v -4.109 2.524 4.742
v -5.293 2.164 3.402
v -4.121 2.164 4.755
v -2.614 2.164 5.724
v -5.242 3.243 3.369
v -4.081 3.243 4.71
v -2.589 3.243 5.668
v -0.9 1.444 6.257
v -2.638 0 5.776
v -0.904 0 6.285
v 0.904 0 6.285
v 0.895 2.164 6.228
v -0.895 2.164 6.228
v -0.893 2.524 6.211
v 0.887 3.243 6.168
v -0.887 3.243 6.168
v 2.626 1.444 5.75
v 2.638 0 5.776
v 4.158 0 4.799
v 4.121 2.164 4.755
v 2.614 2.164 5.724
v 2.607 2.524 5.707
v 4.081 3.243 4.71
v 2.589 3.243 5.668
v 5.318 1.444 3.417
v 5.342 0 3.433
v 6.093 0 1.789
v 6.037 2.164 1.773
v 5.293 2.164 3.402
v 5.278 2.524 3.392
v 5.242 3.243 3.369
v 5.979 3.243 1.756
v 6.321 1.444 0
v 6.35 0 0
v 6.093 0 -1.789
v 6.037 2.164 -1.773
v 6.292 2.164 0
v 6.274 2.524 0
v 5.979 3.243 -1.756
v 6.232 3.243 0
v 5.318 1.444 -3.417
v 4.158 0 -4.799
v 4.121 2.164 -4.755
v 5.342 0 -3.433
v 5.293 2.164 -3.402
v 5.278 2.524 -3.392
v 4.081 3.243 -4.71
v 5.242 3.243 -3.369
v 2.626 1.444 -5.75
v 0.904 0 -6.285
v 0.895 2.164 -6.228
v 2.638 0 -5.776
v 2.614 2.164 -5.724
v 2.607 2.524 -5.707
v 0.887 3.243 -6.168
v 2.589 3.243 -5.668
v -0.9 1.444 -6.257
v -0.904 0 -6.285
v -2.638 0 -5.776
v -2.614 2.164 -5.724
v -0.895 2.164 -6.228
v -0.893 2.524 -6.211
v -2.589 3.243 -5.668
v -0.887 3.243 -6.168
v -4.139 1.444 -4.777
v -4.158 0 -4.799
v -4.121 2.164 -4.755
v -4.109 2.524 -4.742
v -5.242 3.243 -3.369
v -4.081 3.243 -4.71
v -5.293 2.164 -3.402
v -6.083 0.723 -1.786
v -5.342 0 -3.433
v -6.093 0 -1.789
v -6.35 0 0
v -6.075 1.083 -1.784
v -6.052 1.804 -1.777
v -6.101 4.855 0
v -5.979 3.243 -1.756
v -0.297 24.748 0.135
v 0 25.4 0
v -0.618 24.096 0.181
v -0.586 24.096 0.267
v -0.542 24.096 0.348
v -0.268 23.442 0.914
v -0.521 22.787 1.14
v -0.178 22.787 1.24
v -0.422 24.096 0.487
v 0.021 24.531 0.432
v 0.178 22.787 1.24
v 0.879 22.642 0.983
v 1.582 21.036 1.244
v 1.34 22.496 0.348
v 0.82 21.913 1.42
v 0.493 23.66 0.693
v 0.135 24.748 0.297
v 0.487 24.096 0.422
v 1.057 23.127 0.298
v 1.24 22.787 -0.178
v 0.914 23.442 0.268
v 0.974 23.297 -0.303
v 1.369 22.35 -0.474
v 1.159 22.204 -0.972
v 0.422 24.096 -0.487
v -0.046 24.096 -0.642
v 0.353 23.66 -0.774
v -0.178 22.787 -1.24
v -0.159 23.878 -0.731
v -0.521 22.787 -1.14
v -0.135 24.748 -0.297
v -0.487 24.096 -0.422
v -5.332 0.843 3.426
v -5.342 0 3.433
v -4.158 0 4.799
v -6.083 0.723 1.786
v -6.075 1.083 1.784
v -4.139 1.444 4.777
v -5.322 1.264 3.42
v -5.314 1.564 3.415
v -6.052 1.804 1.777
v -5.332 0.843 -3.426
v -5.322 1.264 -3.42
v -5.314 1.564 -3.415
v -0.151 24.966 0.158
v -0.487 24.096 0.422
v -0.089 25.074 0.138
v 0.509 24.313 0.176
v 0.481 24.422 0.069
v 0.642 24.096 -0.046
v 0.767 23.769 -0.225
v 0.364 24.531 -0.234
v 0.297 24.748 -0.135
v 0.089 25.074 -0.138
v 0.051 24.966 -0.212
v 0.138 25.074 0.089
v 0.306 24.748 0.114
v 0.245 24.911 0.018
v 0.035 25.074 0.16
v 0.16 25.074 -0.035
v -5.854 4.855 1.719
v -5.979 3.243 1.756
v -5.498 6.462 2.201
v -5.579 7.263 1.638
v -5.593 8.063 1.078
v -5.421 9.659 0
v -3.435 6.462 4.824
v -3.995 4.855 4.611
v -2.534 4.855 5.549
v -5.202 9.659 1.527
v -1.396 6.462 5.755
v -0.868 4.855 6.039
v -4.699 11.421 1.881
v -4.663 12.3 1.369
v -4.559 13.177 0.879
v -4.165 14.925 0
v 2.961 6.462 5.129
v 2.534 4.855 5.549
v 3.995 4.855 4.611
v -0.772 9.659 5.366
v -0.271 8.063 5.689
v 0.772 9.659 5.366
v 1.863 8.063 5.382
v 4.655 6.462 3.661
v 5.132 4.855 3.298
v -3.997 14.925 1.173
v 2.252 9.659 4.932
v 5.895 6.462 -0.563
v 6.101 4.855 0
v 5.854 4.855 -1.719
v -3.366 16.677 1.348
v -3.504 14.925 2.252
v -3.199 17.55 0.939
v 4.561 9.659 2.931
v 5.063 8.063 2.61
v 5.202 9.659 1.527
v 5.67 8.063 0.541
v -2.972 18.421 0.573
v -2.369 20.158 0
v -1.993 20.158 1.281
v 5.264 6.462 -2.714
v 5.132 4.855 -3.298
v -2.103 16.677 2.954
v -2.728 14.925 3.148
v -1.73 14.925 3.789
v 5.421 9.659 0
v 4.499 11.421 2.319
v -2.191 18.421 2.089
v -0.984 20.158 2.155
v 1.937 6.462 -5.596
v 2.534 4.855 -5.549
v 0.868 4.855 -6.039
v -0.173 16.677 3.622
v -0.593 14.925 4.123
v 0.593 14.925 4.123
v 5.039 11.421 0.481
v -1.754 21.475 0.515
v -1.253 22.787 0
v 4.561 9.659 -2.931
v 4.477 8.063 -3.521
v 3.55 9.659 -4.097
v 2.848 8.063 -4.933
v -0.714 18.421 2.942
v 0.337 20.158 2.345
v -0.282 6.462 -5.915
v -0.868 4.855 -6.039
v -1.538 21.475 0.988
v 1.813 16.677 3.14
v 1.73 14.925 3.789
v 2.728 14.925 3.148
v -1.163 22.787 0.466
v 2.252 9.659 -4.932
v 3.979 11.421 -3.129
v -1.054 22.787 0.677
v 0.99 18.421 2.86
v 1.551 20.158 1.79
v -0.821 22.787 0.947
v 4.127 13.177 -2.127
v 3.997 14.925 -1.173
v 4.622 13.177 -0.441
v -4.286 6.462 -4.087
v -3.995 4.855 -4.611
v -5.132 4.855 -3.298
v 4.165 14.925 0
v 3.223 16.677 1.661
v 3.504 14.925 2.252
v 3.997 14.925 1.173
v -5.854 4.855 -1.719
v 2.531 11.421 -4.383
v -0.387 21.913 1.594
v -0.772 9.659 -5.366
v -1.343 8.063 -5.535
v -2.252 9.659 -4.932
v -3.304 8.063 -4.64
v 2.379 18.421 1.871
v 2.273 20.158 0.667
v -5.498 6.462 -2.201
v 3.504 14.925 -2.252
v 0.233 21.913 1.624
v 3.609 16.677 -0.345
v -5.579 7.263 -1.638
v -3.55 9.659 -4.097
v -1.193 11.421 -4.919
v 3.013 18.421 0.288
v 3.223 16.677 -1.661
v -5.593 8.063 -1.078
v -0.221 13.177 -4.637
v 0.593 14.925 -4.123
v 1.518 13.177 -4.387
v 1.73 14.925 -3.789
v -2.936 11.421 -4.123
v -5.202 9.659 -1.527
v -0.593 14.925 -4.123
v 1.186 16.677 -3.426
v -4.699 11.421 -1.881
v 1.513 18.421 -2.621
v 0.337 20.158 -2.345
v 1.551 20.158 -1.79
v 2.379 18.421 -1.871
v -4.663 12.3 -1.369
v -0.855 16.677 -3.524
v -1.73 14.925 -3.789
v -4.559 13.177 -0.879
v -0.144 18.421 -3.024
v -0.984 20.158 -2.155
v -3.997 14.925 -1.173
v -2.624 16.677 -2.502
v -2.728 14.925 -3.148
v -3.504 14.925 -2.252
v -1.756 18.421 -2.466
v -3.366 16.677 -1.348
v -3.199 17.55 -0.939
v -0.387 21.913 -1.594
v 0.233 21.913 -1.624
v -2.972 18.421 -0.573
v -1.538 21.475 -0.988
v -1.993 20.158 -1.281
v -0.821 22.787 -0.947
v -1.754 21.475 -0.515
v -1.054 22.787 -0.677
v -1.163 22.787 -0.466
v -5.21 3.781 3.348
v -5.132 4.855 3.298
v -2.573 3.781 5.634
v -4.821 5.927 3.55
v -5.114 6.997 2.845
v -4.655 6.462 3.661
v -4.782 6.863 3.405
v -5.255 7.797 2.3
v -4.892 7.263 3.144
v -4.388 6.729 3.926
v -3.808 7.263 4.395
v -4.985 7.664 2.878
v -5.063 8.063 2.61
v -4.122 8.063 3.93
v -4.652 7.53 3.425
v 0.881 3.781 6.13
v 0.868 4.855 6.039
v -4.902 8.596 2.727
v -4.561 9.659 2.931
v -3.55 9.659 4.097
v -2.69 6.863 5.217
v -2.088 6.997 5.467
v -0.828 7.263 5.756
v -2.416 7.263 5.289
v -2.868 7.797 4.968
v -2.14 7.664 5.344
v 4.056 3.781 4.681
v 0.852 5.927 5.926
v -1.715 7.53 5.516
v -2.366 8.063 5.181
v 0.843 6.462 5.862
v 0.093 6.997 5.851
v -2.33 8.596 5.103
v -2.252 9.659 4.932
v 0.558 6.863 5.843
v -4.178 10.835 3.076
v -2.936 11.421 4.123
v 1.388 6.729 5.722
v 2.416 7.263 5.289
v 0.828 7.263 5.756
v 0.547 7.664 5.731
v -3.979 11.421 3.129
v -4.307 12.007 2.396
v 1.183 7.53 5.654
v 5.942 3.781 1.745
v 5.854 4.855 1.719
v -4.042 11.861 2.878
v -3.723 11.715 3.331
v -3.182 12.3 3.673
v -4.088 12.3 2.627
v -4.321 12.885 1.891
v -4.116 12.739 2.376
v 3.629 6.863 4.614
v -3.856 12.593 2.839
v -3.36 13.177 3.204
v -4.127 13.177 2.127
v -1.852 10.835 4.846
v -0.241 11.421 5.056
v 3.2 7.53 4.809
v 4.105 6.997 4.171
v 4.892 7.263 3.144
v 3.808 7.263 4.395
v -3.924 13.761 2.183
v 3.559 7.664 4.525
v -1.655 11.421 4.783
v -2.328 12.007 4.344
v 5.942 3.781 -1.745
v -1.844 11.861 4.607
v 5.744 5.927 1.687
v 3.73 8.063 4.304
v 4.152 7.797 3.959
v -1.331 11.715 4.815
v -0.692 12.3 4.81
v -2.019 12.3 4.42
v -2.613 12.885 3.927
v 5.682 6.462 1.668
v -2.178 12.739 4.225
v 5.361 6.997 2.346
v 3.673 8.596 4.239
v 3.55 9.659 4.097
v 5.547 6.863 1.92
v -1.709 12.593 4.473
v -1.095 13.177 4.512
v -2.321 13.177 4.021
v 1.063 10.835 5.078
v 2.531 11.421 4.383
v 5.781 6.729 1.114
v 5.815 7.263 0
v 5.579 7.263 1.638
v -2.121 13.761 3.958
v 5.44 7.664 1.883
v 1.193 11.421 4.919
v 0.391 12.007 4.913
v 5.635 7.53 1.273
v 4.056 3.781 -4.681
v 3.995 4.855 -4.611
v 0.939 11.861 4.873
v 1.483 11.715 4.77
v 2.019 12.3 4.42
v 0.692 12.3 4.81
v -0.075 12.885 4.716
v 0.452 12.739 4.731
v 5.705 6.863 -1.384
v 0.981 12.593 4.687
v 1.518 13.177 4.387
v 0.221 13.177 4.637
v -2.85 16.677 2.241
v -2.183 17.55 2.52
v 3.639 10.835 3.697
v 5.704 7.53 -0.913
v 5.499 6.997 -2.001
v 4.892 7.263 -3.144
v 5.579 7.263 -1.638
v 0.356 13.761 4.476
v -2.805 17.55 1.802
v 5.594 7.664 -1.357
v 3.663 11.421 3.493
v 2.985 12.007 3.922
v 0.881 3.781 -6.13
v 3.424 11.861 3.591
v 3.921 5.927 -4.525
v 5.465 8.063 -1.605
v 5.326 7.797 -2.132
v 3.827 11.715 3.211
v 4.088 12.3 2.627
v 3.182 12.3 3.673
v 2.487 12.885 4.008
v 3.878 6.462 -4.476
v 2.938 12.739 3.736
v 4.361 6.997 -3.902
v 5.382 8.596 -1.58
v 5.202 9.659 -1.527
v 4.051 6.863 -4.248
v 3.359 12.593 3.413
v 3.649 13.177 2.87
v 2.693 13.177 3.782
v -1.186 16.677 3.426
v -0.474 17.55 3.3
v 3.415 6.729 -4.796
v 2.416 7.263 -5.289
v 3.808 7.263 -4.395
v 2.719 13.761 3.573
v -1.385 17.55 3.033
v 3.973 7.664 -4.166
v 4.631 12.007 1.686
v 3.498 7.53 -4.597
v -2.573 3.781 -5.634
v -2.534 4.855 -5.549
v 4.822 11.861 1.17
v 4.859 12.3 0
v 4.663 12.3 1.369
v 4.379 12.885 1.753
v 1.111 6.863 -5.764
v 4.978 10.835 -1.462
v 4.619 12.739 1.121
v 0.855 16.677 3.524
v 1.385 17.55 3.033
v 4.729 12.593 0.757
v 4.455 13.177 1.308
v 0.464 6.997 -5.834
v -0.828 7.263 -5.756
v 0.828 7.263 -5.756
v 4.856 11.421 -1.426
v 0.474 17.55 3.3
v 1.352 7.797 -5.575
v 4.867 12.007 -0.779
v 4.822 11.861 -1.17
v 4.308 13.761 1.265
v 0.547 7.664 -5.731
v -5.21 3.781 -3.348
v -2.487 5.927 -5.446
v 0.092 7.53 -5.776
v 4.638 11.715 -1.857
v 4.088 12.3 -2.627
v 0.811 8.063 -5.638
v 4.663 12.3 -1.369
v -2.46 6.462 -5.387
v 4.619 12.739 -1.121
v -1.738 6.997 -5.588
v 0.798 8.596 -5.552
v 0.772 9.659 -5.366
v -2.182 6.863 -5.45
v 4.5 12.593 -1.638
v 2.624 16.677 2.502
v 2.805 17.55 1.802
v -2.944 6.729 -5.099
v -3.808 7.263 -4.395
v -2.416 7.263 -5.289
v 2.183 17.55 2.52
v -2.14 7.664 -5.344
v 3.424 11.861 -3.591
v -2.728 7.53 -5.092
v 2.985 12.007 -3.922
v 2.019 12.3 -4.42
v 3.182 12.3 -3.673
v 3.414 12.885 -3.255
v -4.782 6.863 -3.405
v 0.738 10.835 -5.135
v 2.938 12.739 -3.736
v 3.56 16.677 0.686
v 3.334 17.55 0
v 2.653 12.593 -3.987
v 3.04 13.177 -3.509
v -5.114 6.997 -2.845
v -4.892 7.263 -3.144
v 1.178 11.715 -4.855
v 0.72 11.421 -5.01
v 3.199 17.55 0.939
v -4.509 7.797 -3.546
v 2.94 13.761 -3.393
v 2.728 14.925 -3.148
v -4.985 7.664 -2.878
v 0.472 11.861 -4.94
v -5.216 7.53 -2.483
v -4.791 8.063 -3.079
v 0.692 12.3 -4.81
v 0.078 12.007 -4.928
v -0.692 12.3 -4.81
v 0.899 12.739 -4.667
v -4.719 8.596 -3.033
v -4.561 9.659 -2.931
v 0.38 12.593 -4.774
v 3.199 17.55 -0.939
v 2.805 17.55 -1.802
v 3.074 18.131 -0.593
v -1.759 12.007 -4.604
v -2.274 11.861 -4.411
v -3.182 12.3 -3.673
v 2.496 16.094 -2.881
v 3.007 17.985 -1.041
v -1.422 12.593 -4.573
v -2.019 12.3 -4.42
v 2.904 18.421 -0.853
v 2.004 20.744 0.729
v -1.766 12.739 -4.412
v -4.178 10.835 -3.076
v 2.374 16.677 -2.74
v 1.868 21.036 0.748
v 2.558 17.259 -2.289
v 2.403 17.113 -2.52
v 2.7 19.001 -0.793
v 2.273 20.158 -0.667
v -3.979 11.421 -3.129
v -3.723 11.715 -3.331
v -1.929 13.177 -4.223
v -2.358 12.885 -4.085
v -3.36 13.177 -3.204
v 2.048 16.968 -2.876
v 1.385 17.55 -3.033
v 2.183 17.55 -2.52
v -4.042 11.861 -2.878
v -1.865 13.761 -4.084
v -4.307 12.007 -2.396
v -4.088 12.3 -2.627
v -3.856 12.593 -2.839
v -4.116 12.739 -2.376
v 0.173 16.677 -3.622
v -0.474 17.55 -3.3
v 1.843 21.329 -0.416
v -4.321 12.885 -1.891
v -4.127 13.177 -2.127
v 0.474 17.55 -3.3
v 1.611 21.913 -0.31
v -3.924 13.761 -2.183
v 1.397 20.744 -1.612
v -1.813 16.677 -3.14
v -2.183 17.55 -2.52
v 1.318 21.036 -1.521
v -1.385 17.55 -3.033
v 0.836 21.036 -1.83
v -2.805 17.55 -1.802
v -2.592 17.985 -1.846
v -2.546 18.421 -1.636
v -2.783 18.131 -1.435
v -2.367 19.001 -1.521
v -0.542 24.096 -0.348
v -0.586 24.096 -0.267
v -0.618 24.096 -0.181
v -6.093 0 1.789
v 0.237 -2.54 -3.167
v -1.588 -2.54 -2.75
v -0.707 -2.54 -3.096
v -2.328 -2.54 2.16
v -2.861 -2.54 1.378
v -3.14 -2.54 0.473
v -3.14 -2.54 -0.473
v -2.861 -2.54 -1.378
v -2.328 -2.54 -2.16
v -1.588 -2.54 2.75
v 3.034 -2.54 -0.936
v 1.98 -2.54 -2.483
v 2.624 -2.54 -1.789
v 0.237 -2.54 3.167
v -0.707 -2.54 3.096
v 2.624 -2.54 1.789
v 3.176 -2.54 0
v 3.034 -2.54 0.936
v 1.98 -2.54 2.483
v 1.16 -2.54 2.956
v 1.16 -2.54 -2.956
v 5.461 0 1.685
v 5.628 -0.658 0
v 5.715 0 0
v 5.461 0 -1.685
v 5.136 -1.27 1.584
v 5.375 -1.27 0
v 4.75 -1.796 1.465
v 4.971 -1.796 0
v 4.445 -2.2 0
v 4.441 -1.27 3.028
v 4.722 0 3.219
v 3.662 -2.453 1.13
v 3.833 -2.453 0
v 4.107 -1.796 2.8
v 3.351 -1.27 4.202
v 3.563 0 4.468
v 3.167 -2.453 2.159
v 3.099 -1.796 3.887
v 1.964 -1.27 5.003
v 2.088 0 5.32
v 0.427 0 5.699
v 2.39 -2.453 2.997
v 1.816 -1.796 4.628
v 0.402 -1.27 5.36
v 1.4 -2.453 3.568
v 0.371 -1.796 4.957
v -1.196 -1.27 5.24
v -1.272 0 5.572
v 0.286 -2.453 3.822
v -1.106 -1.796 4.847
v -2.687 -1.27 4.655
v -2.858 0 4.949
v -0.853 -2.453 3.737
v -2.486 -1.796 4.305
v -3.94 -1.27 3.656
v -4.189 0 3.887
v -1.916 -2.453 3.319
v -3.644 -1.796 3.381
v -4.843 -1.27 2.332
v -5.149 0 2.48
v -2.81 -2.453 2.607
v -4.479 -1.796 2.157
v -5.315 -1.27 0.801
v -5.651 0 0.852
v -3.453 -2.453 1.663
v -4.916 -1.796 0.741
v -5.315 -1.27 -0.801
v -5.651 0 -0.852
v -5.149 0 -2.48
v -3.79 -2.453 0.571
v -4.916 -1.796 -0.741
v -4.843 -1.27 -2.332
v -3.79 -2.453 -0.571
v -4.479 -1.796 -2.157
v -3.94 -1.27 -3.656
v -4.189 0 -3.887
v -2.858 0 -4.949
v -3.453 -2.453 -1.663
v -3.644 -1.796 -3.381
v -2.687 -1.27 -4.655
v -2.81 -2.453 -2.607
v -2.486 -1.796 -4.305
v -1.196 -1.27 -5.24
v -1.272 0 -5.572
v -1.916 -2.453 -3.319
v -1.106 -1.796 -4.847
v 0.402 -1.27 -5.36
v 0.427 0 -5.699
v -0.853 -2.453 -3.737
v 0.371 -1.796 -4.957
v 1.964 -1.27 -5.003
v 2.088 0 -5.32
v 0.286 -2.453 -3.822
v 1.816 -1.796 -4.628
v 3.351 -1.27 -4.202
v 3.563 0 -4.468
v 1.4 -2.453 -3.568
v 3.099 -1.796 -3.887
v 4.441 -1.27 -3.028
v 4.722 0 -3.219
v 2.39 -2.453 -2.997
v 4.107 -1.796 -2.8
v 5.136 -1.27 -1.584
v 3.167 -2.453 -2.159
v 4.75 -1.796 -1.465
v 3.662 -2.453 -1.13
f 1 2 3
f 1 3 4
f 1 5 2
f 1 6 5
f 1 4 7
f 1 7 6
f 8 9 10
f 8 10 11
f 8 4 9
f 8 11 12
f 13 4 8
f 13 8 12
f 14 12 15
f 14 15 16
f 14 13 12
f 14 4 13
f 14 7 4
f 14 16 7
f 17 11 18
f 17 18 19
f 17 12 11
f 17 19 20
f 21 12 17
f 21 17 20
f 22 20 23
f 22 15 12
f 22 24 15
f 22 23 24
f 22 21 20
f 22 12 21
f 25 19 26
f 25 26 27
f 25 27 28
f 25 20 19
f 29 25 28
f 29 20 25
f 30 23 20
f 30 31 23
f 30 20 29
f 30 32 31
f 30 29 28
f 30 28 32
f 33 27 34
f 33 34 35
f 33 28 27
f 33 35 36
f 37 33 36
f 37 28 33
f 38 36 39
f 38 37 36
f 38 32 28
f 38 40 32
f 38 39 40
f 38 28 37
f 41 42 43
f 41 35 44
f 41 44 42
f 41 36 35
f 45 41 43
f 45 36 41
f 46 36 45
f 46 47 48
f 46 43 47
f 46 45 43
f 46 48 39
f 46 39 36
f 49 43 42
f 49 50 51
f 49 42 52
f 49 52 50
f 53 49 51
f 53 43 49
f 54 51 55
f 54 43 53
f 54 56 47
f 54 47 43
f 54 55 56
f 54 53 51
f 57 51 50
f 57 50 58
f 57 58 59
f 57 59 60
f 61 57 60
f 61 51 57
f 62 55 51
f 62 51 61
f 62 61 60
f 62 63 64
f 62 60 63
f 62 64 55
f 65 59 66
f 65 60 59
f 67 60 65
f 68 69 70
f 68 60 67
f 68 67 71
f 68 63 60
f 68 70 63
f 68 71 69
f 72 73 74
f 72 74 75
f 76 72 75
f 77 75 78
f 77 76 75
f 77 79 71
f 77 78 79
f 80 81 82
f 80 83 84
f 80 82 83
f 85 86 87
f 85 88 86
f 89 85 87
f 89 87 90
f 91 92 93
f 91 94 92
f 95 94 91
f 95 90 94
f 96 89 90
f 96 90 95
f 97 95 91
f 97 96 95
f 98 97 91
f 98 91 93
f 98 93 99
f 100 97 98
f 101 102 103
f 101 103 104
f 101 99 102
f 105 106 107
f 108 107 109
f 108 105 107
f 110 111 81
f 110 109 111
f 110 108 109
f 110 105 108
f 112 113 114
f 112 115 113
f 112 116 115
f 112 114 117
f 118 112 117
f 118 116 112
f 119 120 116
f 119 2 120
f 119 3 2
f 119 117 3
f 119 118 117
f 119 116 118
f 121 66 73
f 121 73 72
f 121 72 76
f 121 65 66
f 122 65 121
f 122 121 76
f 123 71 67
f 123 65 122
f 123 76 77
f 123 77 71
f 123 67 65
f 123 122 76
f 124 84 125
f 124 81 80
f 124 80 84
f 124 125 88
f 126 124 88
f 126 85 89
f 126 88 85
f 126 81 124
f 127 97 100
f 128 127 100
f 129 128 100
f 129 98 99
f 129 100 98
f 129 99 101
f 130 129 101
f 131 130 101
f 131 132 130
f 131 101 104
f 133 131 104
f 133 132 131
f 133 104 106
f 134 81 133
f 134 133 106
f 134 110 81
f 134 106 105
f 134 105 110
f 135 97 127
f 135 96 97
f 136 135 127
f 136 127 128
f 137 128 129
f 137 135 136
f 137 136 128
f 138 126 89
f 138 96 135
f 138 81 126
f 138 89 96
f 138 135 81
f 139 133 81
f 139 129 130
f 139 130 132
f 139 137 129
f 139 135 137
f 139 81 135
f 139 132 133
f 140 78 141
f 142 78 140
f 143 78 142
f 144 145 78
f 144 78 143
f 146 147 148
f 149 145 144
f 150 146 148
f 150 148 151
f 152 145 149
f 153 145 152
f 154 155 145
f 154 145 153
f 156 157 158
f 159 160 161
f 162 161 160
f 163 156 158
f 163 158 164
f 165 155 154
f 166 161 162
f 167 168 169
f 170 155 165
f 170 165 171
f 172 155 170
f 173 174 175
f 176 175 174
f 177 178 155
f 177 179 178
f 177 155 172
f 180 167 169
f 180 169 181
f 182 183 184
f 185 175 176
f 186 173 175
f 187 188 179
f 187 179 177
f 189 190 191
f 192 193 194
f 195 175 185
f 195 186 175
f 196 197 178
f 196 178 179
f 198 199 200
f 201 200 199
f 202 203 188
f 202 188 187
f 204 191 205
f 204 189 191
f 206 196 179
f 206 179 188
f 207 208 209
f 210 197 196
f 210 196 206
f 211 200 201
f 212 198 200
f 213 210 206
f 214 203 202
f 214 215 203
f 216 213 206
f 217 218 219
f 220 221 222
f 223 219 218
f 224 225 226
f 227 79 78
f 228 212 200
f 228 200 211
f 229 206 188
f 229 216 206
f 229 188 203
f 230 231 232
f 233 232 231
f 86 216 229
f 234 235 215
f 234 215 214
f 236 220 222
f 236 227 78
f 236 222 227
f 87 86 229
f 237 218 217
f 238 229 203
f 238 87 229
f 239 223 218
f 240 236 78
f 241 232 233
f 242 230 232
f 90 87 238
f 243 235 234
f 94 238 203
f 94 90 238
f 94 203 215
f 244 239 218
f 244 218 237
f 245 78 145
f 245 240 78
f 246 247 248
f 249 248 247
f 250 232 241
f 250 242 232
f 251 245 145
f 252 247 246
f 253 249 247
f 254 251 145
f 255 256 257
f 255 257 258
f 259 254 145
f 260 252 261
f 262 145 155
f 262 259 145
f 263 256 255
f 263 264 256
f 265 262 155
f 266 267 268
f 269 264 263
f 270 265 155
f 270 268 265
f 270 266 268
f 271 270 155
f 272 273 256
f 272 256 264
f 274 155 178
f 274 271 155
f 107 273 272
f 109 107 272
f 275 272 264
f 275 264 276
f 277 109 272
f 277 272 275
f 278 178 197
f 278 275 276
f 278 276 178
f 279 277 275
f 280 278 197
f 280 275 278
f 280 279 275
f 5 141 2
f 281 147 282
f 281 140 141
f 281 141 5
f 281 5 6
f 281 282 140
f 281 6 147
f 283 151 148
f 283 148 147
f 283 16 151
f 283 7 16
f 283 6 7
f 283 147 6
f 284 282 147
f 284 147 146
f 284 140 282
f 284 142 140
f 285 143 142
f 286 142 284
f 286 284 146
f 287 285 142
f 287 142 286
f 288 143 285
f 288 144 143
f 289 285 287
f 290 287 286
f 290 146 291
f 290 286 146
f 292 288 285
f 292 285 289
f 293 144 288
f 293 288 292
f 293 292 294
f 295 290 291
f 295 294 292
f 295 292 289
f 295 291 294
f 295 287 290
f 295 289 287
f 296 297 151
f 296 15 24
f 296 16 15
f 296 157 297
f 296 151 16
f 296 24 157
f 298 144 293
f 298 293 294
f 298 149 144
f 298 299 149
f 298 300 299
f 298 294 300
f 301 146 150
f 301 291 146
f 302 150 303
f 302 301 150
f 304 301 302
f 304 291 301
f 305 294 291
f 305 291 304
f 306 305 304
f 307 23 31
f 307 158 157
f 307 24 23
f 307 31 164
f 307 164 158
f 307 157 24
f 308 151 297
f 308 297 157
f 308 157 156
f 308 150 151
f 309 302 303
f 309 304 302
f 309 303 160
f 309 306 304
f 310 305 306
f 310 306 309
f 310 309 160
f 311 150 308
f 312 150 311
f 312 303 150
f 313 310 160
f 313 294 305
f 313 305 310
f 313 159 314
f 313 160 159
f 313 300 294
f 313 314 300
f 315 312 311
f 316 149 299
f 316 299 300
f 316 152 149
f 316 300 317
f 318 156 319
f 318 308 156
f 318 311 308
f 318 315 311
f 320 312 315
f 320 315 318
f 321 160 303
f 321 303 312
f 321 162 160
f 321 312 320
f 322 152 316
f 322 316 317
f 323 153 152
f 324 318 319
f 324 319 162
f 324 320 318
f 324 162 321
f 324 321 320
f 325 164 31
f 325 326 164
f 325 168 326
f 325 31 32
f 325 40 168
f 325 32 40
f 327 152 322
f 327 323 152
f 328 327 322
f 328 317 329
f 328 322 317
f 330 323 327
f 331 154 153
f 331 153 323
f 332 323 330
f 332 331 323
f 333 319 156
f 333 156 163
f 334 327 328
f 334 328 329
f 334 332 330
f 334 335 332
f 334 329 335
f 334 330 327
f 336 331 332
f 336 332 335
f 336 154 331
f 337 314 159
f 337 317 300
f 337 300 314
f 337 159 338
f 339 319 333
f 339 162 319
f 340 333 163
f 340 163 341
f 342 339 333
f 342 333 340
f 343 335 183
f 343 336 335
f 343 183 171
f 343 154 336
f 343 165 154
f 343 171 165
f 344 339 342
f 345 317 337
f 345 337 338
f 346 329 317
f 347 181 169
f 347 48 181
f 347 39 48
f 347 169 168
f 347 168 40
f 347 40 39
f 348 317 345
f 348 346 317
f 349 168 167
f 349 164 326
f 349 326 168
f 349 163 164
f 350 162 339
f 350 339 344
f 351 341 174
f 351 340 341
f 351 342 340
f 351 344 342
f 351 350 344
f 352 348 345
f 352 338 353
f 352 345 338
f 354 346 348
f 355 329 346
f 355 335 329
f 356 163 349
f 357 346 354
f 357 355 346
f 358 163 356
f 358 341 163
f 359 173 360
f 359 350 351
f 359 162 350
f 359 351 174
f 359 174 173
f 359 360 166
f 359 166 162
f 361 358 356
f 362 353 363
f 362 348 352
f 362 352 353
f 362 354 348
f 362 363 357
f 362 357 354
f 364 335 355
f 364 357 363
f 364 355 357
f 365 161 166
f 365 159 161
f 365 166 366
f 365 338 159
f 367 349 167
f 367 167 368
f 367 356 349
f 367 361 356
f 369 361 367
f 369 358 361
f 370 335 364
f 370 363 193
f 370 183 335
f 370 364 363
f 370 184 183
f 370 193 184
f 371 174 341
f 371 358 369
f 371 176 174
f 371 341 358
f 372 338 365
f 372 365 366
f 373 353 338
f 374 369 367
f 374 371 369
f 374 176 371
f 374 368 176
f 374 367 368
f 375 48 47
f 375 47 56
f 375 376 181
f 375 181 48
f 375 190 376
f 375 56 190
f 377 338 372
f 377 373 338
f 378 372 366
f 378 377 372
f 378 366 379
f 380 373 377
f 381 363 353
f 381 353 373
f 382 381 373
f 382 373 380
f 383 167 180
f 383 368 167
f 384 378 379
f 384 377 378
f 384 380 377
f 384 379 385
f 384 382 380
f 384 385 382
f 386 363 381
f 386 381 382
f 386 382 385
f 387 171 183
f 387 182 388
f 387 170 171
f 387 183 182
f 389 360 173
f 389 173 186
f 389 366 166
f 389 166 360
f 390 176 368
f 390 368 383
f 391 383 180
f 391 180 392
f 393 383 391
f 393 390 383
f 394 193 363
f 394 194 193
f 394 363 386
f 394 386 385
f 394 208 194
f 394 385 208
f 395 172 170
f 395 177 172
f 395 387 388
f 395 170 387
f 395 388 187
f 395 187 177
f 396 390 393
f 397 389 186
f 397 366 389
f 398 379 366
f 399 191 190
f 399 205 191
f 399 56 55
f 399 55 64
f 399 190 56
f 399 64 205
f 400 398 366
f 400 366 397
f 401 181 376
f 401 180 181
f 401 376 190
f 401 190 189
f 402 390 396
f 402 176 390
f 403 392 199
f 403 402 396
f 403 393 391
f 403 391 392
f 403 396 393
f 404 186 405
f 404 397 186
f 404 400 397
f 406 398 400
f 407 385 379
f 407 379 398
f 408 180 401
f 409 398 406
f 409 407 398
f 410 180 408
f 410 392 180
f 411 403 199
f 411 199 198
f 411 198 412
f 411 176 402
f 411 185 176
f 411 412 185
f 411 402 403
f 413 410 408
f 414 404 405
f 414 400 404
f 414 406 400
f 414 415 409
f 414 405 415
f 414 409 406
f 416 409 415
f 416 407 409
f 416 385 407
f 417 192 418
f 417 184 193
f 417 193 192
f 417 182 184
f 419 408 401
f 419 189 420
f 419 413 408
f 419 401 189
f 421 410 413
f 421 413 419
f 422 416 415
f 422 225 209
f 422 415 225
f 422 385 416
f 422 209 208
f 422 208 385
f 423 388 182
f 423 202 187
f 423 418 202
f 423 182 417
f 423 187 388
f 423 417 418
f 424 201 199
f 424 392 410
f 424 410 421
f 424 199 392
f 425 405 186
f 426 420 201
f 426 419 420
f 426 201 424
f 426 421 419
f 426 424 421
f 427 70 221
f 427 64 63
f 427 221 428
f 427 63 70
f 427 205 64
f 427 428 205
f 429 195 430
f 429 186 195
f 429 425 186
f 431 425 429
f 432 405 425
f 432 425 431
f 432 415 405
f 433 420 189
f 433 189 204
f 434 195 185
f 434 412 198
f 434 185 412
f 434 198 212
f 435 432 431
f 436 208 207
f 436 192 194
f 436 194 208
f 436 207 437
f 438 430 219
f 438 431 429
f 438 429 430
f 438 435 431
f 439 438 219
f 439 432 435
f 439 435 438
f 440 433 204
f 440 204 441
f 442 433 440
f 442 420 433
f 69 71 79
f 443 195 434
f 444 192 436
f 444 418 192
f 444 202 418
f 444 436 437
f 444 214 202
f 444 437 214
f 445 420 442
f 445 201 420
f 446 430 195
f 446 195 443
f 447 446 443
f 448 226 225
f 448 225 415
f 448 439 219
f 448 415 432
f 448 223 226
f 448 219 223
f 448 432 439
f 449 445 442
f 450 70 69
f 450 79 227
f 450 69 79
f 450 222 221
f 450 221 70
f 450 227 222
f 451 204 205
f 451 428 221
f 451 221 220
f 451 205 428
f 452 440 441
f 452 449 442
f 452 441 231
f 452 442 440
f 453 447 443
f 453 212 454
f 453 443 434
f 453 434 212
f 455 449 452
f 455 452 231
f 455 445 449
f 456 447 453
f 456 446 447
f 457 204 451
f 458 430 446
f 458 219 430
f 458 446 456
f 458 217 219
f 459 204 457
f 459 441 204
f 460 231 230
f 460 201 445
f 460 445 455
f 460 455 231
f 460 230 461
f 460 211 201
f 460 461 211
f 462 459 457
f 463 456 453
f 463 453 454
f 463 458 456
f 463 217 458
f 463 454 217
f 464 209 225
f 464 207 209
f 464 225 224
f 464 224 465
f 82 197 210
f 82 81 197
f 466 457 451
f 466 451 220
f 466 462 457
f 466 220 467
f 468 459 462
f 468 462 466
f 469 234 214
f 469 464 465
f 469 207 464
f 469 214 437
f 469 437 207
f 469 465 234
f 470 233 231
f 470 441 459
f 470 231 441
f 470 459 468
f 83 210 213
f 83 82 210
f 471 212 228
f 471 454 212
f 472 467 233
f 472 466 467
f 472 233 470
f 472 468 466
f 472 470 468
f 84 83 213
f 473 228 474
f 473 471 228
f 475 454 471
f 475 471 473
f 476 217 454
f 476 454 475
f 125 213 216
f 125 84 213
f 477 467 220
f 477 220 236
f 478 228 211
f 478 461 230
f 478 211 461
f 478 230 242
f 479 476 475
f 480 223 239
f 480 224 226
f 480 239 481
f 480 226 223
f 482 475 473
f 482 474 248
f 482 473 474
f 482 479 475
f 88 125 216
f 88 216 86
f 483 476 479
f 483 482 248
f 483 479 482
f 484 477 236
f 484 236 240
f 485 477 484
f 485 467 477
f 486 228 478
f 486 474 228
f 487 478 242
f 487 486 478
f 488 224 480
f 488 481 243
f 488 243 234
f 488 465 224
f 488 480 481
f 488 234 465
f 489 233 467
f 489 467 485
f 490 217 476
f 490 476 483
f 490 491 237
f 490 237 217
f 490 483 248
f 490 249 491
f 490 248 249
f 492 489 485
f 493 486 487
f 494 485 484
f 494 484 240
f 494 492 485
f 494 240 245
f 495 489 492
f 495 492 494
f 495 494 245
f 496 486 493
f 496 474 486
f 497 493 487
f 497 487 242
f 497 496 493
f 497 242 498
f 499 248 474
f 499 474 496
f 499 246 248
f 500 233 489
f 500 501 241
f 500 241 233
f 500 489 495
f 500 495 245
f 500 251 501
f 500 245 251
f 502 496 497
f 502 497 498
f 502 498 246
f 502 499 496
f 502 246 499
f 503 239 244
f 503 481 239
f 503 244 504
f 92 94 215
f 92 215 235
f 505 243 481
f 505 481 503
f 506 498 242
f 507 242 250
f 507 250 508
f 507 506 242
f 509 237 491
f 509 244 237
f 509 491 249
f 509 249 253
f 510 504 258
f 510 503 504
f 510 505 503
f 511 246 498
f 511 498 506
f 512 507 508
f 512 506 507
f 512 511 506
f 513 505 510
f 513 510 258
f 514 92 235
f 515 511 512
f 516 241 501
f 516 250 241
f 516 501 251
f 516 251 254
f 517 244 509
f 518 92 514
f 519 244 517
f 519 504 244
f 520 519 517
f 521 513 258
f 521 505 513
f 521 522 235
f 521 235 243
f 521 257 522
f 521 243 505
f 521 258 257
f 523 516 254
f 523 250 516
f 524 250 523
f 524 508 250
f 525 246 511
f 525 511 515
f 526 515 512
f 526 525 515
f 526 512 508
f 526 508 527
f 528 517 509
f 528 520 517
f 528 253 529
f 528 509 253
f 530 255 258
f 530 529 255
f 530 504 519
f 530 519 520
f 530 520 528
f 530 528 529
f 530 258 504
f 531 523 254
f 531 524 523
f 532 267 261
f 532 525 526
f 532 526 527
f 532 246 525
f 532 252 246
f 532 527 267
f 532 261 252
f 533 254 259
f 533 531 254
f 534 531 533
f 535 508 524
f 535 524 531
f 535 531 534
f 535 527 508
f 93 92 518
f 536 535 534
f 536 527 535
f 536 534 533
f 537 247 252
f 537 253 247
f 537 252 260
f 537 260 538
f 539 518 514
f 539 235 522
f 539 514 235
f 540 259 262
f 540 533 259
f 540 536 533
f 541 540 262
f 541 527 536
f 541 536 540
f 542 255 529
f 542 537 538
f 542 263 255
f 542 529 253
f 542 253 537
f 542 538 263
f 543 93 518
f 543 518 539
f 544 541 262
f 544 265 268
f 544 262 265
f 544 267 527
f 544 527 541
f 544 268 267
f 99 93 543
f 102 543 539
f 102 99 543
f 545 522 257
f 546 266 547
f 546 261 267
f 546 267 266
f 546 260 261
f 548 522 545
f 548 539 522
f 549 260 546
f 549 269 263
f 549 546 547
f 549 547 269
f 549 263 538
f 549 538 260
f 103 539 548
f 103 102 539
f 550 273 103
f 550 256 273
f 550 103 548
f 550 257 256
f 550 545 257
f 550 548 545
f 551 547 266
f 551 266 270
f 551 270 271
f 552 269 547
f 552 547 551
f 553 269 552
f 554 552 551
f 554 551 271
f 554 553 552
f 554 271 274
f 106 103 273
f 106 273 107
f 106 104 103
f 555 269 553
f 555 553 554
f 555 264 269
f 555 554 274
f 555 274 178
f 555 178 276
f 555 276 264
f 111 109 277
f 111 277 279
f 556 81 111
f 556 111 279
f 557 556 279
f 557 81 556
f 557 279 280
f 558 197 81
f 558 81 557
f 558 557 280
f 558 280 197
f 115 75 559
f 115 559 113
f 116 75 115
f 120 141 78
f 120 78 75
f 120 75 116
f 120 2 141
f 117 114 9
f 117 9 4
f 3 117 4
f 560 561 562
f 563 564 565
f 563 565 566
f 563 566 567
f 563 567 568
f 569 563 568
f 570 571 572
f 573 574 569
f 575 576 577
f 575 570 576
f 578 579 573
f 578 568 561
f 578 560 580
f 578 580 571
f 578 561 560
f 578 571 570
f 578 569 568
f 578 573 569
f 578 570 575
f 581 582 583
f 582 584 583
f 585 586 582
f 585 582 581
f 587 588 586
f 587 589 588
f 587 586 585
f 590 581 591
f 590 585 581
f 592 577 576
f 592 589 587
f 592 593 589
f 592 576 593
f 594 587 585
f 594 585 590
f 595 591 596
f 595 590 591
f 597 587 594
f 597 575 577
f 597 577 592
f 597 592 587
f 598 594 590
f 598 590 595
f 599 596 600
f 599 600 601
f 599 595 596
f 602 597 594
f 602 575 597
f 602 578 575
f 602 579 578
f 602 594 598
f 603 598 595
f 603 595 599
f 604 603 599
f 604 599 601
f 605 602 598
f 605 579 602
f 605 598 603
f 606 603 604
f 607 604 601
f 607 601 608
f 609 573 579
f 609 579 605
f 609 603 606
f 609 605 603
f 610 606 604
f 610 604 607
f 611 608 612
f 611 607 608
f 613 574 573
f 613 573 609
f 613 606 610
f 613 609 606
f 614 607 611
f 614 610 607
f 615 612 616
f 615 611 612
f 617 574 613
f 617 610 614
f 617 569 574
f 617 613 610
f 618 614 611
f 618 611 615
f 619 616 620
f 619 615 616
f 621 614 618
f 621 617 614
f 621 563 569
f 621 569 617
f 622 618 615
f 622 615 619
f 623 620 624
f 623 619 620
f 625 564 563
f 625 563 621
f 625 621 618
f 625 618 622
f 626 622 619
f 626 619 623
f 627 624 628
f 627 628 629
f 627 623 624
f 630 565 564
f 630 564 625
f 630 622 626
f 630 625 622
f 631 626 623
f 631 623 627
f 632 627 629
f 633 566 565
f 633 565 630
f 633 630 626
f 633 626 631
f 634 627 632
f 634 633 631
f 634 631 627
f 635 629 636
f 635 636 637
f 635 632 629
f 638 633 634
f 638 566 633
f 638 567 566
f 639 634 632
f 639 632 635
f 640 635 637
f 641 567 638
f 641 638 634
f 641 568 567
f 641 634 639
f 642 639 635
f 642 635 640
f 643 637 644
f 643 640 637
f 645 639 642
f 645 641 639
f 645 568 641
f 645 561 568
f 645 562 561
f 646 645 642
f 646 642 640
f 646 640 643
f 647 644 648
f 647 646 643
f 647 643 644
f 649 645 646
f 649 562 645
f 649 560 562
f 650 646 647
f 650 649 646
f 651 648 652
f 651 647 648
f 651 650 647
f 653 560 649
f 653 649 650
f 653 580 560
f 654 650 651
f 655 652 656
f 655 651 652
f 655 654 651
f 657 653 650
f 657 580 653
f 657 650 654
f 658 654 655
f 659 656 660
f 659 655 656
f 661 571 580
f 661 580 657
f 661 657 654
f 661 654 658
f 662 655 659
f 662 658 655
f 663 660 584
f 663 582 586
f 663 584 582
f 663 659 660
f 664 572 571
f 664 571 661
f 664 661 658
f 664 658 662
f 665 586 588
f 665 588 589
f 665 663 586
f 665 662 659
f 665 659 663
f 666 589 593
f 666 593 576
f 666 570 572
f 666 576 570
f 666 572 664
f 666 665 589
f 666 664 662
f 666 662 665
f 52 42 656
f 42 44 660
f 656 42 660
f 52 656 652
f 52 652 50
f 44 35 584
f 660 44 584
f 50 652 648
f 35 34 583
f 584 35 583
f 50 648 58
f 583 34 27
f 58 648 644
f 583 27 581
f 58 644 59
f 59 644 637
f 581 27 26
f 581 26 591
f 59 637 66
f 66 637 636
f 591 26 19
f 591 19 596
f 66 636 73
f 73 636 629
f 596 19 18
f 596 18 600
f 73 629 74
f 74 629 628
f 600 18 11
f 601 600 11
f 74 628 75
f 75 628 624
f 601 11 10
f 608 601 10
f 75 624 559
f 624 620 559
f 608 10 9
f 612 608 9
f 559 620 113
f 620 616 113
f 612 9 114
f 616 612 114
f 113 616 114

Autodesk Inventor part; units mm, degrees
ref_plane "YZ Plane" through (0, 0, 0) normal (1, 0, 0) x (0, 1, 0)
ref_plane "XZ Plane" through (0, 0, 0) normal (0, 1, 0) x (-1, 0, 0)
ref_plane "XY Plane" through (0, 0, 0) normal (0, 0, 1) x (1, 0, 0)
sketch "Sketch1" plane through (0, 0, 0) normal (0, 0, 1) x (1, 0, 0)
  line L0 (0, 0) -> (-6.35, 0)
  line L1 (0, 0) -> (0, 25.4)
  spline S0 degree 2 poles (-6.35, 0) (-6.2585, 13.0686) (0, 25.4) knots 0 0 0 1 1 1
  point P0 (-4.7625, 12.7)
  dimension "d0" = 6.35
  dimension "d1" = 25.4
revolve "Revolution1" add sketch "Sketch1" angle 360 about axis through (0, 0, 0) along (0, 1, 0)
sketch "Sketch2" plane through (0, 0, 0) normal (0, -1, 0) x (1, 0, 0)
  circle A0 centre (0, 0) radius 5.715
  dimension "d3" = 11.43
extrude "Extrusion1" add sketch "Sketch2" along normal blind 2.54
fillet "Fillet1" radius 2.54 1 edges at (-5.715, -2.54, 0)
properties part number "Rocket - Nose Cone"
